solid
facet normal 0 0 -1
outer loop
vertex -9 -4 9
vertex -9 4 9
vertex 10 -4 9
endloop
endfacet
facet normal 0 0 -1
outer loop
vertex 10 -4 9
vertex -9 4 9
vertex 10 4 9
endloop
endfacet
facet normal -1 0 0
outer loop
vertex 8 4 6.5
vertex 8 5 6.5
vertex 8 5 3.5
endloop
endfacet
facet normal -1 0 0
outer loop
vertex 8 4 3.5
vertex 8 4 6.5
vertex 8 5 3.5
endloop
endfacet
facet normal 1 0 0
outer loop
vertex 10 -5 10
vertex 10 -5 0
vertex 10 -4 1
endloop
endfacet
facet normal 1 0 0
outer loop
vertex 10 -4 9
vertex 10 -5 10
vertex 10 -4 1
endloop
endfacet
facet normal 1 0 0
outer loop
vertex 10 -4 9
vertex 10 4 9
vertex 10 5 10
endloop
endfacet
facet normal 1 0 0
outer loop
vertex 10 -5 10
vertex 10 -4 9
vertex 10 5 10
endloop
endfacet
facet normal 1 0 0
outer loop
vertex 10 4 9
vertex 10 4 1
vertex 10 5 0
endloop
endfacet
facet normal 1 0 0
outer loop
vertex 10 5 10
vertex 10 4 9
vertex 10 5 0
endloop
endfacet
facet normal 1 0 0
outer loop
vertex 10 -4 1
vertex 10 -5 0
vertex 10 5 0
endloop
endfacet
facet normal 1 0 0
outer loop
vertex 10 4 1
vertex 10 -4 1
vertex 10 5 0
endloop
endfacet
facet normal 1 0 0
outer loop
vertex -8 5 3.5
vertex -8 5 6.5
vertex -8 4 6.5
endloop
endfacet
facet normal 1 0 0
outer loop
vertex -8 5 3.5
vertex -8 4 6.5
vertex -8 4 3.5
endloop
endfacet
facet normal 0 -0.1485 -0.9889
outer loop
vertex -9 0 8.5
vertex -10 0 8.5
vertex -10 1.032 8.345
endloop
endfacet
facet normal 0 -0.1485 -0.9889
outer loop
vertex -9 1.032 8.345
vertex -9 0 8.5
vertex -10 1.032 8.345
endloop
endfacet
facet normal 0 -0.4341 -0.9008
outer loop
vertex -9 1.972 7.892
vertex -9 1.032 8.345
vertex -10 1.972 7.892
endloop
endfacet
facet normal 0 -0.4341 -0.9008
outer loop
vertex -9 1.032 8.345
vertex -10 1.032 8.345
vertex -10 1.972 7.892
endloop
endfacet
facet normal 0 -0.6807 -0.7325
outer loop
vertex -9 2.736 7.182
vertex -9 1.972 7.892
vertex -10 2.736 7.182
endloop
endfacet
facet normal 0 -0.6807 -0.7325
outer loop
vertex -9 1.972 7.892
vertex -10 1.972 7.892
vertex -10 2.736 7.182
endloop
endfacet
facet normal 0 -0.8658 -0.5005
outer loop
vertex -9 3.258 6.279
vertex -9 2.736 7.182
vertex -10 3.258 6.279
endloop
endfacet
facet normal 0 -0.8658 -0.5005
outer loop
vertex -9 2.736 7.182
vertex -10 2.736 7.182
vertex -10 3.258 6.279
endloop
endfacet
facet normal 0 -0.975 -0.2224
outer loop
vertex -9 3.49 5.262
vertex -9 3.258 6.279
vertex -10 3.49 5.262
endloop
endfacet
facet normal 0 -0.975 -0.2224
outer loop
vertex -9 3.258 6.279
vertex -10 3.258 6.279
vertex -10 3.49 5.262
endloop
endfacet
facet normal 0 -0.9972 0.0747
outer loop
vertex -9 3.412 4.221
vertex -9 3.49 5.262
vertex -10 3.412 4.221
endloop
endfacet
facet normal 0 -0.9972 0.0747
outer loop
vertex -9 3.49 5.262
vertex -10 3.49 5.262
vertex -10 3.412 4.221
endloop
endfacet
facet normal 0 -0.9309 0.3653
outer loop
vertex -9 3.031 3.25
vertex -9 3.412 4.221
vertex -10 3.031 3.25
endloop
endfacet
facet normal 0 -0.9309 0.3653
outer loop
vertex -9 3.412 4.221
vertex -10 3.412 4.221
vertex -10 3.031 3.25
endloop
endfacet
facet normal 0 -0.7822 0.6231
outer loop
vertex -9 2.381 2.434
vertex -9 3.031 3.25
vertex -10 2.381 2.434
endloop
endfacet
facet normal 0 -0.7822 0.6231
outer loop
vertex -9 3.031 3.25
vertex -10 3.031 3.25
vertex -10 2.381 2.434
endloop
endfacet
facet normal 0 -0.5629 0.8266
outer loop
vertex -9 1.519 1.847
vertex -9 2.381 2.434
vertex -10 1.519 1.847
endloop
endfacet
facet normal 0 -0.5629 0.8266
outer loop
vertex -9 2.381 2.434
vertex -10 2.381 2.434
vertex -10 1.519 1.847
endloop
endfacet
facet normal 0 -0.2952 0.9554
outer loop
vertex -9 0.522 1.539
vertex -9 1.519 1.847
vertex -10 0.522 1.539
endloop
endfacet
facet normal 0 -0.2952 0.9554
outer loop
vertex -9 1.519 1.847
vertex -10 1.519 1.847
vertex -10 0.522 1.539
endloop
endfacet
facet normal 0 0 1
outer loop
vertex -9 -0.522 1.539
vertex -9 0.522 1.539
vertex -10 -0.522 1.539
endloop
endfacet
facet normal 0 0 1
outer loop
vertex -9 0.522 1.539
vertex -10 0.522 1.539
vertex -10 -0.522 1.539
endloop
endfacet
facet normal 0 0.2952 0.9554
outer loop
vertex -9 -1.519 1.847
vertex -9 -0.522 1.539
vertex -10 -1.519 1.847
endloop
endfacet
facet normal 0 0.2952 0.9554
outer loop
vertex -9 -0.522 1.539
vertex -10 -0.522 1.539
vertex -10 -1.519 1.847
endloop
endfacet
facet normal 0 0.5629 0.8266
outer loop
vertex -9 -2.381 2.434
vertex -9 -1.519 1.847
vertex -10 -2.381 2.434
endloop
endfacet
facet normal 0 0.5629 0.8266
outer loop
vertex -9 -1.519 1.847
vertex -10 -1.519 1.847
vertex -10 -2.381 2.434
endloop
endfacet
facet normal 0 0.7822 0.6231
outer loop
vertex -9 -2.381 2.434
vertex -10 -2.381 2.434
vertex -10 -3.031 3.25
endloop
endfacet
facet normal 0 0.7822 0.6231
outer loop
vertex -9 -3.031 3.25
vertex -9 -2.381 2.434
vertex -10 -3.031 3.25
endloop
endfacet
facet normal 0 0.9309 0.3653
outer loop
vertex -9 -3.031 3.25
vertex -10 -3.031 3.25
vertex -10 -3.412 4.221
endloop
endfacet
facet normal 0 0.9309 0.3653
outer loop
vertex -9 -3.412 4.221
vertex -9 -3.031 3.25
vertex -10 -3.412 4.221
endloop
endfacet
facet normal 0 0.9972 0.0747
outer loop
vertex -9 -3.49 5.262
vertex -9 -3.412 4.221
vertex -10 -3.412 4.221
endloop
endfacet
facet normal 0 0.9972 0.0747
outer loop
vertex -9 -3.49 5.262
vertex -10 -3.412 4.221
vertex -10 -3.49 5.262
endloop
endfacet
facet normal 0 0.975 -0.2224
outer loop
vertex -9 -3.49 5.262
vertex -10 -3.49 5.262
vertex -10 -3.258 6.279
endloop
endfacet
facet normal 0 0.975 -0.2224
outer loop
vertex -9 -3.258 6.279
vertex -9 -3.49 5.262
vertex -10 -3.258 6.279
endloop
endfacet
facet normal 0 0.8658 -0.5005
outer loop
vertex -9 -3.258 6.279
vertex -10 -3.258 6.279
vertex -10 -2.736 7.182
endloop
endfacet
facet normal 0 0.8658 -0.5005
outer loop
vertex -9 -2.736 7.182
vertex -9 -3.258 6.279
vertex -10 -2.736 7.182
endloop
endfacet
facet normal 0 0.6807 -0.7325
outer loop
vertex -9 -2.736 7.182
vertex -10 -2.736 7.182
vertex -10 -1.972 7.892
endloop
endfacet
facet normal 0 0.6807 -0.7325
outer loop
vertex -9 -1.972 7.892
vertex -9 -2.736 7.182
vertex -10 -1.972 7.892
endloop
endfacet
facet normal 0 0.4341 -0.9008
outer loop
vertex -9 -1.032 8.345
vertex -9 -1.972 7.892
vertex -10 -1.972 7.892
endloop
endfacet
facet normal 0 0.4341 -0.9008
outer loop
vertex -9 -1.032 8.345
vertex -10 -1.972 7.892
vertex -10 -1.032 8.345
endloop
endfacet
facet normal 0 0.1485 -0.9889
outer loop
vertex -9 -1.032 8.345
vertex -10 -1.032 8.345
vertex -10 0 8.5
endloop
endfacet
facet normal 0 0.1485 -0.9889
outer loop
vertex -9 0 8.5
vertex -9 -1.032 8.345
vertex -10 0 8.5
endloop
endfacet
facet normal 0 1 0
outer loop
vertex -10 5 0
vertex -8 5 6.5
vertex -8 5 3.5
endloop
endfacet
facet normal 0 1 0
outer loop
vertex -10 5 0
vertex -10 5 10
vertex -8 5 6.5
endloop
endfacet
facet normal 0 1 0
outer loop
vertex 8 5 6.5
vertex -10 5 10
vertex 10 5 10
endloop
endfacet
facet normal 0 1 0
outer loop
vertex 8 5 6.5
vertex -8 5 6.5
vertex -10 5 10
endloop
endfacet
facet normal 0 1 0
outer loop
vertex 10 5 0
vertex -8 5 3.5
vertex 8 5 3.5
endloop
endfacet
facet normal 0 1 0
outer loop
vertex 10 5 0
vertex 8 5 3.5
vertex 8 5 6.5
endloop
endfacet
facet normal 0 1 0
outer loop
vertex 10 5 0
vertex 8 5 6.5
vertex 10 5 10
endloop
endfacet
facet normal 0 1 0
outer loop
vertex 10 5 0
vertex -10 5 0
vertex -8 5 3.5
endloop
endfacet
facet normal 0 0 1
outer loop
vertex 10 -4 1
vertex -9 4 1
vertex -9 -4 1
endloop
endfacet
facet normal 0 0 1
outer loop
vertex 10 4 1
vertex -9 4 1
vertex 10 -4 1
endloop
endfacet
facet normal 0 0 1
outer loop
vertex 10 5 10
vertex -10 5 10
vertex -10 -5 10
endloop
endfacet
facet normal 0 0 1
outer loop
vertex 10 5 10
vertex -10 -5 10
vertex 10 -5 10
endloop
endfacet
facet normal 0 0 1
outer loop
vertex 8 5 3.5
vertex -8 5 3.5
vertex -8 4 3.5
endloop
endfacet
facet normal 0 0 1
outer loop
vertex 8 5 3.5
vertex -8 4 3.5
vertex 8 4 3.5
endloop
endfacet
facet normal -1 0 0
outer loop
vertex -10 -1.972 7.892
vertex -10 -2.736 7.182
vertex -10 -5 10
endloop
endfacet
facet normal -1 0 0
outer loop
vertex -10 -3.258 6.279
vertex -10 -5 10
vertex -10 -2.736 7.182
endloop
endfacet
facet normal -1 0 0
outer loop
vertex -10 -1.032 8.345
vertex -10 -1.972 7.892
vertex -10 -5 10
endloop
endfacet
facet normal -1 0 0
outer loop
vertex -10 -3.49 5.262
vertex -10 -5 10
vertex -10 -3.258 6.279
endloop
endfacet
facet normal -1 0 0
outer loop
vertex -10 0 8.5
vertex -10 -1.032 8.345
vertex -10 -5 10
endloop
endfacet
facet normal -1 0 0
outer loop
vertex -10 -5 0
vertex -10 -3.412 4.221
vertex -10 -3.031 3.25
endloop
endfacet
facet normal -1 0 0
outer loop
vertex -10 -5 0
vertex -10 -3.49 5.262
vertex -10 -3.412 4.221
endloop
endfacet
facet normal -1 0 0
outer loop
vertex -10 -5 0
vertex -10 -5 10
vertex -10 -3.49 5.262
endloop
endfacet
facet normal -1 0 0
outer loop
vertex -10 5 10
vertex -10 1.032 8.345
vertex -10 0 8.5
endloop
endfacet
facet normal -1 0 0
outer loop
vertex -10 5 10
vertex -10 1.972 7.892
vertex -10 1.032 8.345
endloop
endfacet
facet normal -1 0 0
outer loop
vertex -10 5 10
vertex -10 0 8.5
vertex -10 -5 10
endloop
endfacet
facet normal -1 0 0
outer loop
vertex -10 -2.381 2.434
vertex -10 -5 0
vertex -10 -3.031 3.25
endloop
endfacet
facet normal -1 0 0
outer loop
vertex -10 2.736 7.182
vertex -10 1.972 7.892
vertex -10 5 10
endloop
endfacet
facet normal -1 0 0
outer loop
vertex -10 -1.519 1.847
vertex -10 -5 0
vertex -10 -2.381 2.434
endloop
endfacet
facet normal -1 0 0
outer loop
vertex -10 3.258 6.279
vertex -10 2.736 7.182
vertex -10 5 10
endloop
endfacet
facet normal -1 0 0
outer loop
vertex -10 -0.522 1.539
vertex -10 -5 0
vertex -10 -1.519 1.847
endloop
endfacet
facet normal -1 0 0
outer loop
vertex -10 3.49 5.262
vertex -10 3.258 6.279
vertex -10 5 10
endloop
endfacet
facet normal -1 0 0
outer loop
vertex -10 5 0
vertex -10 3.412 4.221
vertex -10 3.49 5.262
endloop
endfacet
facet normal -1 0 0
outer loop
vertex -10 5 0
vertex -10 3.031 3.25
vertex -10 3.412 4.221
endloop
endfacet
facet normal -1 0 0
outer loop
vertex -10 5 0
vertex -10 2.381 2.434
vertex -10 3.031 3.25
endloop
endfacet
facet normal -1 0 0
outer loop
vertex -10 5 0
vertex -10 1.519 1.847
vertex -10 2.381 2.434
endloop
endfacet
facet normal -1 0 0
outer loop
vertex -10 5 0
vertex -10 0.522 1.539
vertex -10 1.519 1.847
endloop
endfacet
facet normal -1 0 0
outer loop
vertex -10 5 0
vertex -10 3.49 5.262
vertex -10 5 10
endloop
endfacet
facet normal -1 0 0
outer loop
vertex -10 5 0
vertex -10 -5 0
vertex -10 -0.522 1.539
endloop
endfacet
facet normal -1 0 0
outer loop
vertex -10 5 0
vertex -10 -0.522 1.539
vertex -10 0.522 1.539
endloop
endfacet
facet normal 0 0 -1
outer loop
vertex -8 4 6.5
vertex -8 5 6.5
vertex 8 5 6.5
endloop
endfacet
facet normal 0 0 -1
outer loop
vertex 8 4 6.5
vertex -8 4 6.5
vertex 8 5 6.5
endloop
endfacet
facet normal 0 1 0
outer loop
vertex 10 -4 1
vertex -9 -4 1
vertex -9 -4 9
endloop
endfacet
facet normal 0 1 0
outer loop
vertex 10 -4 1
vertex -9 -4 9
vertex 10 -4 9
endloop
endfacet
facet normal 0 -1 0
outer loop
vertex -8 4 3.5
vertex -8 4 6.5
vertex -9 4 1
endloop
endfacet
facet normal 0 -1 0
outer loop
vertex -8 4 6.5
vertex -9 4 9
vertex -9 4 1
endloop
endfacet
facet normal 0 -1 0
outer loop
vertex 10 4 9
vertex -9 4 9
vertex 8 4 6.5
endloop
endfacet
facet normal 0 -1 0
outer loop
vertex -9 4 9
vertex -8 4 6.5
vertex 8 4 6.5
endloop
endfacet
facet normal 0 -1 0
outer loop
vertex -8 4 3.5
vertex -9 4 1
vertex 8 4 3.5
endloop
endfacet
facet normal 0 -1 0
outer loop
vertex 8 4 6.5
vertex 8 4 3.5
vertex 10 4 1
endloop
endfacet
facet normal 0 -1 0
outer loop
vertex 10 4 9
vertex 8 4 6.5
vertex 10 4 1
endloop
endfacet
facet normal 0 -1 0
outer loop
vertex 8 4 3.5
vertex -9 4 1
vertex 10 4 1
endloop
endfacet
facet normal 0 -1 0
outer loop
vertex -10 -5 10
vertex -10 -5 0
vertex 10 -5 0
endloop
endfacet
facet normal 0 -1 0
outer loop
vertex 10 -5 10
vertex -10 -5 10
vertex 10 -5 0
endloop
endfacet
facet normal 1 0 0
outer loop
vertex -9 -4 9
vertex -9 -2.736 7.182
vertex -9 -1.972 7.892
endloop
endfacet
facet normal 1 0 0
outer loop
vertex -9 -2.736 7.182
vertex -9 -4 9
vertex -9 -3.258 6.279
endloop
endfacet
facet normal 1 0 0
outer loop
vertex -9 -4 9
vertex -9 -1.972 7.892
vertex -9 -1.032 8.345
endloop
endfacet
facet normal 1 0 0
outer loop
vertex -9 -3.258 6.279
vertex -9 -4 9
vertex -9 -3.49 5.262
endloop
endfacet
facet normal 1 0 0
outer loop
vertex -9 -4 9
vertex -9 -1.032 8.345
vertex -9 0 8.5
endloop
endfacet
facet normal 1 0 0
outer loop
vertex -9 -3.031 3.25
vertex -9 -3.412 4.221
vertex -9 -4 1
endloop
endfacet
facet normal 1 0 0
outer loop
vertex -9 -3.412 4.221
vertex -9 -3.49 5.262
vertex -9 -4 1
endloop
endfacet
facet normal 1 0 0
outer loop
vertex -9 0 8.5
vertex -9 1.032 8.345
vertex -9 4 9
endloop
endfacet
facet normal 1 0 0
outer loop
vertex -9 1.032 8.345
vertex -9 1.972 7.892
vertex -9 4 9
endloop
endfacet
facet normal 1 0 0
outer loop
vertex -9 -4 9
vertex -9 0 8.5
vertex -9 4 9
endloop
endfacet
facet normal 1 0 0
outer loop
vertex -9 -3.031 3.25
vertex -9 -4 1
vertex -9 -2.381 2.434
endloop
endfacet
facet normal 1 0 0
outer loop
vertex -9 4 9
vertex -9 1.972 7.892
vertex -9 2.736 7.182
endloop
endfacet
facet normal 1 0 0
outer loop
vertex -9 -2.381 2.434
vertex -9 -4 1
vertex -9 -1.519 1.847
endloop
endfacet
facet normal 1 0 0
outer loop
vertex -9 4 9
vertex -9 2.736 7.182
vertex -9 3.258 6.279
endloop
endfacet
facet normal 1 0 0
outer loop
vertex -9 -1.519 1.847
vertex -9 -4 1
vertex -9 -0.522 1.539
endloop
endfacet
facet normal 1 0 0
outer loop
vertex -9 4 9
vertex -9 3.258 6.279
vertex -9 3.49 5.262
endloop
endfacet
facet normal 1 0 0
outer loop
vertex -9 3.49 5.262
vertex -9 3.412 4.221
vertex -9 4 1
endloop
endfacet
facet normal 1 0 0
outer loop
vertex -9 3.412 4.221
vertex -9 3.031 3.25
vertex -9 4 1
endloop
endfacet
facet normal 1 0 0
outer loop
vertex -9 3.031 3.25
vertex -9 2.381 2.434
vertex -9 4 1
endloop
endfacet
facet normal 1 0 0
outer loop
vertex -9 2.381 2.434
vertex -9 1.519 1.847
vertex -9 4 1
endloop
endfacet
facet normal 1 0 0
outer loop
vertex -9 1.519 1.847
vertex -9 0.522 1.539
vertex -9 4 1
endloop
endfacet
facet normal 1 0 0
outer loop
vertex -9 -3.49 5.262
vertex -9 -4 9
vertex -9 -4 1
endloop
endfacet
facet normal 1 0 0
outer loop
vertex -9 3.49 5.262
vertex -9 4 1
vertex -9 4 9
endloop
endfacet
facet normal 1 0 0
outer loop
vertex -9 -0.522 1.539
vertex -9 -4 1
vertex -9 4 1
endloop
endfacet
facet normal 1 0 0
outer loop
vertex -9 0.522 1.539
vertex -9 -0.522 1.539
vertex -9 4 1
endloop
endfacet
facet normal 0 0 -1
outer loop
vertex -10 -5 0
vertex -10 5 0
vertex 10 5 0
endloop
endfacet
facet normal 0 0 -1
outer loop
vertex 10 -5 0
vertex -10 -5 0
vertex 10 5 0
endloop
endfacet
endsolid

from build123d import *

# Parameters (mm, degrees)
SKETCH1_W           = 20
SKETCH1_H           = 10
BOSS_EXTRUDE1_DEPTH = 10
SHELL1_T            = -1
CUT_EXTRUDE1_REACH  = 22
SKETCH3_R           = 3.5
CUT_EXTRUDE2_REACH  = 12
SKETCH5_W           = 16
SKETCH5_H           = 3


with BuildPart() as part:
    # Sketch1 → Boss-Extrude1 (new body)
    with BuildSketch(Plane.XY):
        Rectangle(SKETCH1_W, SKETCH1_H)
    extrude(amount=BOSS_EXTRUDE1_DEPTH)

    # Shell1
    shell1_openings = [part.faces().sort_by_distance(p)[0] for p in [
        (10, 0, 5),
    ]]
    offset(amount=SHELL1_T, openings=shell1_openings, kind=Kind.INTERSECTION)

    # Sketch3 → Cut-Extrude1 (cut, up to next)
    with BuildSketch(Plane.ZY.offset(10), mode=Mode.PRIVATE) as cut_extrude1_sk1:
        with Locations((5, 0)):
            Circle(SKETCH3_R)
    cut_extrude1_tool1 = extrude(cut_extrude1_sk1.sketch, amount=-CUT_EXTRUDE1_REACH, mode=Mode.PRIVATE) & part.part
    add(cut_extrude1_tool1.solids().sort_by_distance((-10, 0, 5))[0], mode=Mode.SUBTRACT)

    # Sketch5 → Cut-Extrude2 (cut, up to next)
    with BuildSketch(Plane(origin=(0, 5, 0), x_dir=(1, 0, 0), z_dir=(0, 1, 0)), mode=Mode.PRIVATE) as cut_extrude2_sk1:
        with Locations((0, -5)):
            Rectangle(SKETCH5_W, SKETCH5_H)
    cut_extrude2_tool1 = extrude(cut_extrude2_sk1.sketch, amount=-CUT_EXTRUDE2_REACH, mode=Mode.PRIVATE) & part.part
    add(cut_extrude2_tool1.solids().sort_by_distance((0, 5, 5))[0], mode=Mode.SUBTRACT)


solid = part.part
